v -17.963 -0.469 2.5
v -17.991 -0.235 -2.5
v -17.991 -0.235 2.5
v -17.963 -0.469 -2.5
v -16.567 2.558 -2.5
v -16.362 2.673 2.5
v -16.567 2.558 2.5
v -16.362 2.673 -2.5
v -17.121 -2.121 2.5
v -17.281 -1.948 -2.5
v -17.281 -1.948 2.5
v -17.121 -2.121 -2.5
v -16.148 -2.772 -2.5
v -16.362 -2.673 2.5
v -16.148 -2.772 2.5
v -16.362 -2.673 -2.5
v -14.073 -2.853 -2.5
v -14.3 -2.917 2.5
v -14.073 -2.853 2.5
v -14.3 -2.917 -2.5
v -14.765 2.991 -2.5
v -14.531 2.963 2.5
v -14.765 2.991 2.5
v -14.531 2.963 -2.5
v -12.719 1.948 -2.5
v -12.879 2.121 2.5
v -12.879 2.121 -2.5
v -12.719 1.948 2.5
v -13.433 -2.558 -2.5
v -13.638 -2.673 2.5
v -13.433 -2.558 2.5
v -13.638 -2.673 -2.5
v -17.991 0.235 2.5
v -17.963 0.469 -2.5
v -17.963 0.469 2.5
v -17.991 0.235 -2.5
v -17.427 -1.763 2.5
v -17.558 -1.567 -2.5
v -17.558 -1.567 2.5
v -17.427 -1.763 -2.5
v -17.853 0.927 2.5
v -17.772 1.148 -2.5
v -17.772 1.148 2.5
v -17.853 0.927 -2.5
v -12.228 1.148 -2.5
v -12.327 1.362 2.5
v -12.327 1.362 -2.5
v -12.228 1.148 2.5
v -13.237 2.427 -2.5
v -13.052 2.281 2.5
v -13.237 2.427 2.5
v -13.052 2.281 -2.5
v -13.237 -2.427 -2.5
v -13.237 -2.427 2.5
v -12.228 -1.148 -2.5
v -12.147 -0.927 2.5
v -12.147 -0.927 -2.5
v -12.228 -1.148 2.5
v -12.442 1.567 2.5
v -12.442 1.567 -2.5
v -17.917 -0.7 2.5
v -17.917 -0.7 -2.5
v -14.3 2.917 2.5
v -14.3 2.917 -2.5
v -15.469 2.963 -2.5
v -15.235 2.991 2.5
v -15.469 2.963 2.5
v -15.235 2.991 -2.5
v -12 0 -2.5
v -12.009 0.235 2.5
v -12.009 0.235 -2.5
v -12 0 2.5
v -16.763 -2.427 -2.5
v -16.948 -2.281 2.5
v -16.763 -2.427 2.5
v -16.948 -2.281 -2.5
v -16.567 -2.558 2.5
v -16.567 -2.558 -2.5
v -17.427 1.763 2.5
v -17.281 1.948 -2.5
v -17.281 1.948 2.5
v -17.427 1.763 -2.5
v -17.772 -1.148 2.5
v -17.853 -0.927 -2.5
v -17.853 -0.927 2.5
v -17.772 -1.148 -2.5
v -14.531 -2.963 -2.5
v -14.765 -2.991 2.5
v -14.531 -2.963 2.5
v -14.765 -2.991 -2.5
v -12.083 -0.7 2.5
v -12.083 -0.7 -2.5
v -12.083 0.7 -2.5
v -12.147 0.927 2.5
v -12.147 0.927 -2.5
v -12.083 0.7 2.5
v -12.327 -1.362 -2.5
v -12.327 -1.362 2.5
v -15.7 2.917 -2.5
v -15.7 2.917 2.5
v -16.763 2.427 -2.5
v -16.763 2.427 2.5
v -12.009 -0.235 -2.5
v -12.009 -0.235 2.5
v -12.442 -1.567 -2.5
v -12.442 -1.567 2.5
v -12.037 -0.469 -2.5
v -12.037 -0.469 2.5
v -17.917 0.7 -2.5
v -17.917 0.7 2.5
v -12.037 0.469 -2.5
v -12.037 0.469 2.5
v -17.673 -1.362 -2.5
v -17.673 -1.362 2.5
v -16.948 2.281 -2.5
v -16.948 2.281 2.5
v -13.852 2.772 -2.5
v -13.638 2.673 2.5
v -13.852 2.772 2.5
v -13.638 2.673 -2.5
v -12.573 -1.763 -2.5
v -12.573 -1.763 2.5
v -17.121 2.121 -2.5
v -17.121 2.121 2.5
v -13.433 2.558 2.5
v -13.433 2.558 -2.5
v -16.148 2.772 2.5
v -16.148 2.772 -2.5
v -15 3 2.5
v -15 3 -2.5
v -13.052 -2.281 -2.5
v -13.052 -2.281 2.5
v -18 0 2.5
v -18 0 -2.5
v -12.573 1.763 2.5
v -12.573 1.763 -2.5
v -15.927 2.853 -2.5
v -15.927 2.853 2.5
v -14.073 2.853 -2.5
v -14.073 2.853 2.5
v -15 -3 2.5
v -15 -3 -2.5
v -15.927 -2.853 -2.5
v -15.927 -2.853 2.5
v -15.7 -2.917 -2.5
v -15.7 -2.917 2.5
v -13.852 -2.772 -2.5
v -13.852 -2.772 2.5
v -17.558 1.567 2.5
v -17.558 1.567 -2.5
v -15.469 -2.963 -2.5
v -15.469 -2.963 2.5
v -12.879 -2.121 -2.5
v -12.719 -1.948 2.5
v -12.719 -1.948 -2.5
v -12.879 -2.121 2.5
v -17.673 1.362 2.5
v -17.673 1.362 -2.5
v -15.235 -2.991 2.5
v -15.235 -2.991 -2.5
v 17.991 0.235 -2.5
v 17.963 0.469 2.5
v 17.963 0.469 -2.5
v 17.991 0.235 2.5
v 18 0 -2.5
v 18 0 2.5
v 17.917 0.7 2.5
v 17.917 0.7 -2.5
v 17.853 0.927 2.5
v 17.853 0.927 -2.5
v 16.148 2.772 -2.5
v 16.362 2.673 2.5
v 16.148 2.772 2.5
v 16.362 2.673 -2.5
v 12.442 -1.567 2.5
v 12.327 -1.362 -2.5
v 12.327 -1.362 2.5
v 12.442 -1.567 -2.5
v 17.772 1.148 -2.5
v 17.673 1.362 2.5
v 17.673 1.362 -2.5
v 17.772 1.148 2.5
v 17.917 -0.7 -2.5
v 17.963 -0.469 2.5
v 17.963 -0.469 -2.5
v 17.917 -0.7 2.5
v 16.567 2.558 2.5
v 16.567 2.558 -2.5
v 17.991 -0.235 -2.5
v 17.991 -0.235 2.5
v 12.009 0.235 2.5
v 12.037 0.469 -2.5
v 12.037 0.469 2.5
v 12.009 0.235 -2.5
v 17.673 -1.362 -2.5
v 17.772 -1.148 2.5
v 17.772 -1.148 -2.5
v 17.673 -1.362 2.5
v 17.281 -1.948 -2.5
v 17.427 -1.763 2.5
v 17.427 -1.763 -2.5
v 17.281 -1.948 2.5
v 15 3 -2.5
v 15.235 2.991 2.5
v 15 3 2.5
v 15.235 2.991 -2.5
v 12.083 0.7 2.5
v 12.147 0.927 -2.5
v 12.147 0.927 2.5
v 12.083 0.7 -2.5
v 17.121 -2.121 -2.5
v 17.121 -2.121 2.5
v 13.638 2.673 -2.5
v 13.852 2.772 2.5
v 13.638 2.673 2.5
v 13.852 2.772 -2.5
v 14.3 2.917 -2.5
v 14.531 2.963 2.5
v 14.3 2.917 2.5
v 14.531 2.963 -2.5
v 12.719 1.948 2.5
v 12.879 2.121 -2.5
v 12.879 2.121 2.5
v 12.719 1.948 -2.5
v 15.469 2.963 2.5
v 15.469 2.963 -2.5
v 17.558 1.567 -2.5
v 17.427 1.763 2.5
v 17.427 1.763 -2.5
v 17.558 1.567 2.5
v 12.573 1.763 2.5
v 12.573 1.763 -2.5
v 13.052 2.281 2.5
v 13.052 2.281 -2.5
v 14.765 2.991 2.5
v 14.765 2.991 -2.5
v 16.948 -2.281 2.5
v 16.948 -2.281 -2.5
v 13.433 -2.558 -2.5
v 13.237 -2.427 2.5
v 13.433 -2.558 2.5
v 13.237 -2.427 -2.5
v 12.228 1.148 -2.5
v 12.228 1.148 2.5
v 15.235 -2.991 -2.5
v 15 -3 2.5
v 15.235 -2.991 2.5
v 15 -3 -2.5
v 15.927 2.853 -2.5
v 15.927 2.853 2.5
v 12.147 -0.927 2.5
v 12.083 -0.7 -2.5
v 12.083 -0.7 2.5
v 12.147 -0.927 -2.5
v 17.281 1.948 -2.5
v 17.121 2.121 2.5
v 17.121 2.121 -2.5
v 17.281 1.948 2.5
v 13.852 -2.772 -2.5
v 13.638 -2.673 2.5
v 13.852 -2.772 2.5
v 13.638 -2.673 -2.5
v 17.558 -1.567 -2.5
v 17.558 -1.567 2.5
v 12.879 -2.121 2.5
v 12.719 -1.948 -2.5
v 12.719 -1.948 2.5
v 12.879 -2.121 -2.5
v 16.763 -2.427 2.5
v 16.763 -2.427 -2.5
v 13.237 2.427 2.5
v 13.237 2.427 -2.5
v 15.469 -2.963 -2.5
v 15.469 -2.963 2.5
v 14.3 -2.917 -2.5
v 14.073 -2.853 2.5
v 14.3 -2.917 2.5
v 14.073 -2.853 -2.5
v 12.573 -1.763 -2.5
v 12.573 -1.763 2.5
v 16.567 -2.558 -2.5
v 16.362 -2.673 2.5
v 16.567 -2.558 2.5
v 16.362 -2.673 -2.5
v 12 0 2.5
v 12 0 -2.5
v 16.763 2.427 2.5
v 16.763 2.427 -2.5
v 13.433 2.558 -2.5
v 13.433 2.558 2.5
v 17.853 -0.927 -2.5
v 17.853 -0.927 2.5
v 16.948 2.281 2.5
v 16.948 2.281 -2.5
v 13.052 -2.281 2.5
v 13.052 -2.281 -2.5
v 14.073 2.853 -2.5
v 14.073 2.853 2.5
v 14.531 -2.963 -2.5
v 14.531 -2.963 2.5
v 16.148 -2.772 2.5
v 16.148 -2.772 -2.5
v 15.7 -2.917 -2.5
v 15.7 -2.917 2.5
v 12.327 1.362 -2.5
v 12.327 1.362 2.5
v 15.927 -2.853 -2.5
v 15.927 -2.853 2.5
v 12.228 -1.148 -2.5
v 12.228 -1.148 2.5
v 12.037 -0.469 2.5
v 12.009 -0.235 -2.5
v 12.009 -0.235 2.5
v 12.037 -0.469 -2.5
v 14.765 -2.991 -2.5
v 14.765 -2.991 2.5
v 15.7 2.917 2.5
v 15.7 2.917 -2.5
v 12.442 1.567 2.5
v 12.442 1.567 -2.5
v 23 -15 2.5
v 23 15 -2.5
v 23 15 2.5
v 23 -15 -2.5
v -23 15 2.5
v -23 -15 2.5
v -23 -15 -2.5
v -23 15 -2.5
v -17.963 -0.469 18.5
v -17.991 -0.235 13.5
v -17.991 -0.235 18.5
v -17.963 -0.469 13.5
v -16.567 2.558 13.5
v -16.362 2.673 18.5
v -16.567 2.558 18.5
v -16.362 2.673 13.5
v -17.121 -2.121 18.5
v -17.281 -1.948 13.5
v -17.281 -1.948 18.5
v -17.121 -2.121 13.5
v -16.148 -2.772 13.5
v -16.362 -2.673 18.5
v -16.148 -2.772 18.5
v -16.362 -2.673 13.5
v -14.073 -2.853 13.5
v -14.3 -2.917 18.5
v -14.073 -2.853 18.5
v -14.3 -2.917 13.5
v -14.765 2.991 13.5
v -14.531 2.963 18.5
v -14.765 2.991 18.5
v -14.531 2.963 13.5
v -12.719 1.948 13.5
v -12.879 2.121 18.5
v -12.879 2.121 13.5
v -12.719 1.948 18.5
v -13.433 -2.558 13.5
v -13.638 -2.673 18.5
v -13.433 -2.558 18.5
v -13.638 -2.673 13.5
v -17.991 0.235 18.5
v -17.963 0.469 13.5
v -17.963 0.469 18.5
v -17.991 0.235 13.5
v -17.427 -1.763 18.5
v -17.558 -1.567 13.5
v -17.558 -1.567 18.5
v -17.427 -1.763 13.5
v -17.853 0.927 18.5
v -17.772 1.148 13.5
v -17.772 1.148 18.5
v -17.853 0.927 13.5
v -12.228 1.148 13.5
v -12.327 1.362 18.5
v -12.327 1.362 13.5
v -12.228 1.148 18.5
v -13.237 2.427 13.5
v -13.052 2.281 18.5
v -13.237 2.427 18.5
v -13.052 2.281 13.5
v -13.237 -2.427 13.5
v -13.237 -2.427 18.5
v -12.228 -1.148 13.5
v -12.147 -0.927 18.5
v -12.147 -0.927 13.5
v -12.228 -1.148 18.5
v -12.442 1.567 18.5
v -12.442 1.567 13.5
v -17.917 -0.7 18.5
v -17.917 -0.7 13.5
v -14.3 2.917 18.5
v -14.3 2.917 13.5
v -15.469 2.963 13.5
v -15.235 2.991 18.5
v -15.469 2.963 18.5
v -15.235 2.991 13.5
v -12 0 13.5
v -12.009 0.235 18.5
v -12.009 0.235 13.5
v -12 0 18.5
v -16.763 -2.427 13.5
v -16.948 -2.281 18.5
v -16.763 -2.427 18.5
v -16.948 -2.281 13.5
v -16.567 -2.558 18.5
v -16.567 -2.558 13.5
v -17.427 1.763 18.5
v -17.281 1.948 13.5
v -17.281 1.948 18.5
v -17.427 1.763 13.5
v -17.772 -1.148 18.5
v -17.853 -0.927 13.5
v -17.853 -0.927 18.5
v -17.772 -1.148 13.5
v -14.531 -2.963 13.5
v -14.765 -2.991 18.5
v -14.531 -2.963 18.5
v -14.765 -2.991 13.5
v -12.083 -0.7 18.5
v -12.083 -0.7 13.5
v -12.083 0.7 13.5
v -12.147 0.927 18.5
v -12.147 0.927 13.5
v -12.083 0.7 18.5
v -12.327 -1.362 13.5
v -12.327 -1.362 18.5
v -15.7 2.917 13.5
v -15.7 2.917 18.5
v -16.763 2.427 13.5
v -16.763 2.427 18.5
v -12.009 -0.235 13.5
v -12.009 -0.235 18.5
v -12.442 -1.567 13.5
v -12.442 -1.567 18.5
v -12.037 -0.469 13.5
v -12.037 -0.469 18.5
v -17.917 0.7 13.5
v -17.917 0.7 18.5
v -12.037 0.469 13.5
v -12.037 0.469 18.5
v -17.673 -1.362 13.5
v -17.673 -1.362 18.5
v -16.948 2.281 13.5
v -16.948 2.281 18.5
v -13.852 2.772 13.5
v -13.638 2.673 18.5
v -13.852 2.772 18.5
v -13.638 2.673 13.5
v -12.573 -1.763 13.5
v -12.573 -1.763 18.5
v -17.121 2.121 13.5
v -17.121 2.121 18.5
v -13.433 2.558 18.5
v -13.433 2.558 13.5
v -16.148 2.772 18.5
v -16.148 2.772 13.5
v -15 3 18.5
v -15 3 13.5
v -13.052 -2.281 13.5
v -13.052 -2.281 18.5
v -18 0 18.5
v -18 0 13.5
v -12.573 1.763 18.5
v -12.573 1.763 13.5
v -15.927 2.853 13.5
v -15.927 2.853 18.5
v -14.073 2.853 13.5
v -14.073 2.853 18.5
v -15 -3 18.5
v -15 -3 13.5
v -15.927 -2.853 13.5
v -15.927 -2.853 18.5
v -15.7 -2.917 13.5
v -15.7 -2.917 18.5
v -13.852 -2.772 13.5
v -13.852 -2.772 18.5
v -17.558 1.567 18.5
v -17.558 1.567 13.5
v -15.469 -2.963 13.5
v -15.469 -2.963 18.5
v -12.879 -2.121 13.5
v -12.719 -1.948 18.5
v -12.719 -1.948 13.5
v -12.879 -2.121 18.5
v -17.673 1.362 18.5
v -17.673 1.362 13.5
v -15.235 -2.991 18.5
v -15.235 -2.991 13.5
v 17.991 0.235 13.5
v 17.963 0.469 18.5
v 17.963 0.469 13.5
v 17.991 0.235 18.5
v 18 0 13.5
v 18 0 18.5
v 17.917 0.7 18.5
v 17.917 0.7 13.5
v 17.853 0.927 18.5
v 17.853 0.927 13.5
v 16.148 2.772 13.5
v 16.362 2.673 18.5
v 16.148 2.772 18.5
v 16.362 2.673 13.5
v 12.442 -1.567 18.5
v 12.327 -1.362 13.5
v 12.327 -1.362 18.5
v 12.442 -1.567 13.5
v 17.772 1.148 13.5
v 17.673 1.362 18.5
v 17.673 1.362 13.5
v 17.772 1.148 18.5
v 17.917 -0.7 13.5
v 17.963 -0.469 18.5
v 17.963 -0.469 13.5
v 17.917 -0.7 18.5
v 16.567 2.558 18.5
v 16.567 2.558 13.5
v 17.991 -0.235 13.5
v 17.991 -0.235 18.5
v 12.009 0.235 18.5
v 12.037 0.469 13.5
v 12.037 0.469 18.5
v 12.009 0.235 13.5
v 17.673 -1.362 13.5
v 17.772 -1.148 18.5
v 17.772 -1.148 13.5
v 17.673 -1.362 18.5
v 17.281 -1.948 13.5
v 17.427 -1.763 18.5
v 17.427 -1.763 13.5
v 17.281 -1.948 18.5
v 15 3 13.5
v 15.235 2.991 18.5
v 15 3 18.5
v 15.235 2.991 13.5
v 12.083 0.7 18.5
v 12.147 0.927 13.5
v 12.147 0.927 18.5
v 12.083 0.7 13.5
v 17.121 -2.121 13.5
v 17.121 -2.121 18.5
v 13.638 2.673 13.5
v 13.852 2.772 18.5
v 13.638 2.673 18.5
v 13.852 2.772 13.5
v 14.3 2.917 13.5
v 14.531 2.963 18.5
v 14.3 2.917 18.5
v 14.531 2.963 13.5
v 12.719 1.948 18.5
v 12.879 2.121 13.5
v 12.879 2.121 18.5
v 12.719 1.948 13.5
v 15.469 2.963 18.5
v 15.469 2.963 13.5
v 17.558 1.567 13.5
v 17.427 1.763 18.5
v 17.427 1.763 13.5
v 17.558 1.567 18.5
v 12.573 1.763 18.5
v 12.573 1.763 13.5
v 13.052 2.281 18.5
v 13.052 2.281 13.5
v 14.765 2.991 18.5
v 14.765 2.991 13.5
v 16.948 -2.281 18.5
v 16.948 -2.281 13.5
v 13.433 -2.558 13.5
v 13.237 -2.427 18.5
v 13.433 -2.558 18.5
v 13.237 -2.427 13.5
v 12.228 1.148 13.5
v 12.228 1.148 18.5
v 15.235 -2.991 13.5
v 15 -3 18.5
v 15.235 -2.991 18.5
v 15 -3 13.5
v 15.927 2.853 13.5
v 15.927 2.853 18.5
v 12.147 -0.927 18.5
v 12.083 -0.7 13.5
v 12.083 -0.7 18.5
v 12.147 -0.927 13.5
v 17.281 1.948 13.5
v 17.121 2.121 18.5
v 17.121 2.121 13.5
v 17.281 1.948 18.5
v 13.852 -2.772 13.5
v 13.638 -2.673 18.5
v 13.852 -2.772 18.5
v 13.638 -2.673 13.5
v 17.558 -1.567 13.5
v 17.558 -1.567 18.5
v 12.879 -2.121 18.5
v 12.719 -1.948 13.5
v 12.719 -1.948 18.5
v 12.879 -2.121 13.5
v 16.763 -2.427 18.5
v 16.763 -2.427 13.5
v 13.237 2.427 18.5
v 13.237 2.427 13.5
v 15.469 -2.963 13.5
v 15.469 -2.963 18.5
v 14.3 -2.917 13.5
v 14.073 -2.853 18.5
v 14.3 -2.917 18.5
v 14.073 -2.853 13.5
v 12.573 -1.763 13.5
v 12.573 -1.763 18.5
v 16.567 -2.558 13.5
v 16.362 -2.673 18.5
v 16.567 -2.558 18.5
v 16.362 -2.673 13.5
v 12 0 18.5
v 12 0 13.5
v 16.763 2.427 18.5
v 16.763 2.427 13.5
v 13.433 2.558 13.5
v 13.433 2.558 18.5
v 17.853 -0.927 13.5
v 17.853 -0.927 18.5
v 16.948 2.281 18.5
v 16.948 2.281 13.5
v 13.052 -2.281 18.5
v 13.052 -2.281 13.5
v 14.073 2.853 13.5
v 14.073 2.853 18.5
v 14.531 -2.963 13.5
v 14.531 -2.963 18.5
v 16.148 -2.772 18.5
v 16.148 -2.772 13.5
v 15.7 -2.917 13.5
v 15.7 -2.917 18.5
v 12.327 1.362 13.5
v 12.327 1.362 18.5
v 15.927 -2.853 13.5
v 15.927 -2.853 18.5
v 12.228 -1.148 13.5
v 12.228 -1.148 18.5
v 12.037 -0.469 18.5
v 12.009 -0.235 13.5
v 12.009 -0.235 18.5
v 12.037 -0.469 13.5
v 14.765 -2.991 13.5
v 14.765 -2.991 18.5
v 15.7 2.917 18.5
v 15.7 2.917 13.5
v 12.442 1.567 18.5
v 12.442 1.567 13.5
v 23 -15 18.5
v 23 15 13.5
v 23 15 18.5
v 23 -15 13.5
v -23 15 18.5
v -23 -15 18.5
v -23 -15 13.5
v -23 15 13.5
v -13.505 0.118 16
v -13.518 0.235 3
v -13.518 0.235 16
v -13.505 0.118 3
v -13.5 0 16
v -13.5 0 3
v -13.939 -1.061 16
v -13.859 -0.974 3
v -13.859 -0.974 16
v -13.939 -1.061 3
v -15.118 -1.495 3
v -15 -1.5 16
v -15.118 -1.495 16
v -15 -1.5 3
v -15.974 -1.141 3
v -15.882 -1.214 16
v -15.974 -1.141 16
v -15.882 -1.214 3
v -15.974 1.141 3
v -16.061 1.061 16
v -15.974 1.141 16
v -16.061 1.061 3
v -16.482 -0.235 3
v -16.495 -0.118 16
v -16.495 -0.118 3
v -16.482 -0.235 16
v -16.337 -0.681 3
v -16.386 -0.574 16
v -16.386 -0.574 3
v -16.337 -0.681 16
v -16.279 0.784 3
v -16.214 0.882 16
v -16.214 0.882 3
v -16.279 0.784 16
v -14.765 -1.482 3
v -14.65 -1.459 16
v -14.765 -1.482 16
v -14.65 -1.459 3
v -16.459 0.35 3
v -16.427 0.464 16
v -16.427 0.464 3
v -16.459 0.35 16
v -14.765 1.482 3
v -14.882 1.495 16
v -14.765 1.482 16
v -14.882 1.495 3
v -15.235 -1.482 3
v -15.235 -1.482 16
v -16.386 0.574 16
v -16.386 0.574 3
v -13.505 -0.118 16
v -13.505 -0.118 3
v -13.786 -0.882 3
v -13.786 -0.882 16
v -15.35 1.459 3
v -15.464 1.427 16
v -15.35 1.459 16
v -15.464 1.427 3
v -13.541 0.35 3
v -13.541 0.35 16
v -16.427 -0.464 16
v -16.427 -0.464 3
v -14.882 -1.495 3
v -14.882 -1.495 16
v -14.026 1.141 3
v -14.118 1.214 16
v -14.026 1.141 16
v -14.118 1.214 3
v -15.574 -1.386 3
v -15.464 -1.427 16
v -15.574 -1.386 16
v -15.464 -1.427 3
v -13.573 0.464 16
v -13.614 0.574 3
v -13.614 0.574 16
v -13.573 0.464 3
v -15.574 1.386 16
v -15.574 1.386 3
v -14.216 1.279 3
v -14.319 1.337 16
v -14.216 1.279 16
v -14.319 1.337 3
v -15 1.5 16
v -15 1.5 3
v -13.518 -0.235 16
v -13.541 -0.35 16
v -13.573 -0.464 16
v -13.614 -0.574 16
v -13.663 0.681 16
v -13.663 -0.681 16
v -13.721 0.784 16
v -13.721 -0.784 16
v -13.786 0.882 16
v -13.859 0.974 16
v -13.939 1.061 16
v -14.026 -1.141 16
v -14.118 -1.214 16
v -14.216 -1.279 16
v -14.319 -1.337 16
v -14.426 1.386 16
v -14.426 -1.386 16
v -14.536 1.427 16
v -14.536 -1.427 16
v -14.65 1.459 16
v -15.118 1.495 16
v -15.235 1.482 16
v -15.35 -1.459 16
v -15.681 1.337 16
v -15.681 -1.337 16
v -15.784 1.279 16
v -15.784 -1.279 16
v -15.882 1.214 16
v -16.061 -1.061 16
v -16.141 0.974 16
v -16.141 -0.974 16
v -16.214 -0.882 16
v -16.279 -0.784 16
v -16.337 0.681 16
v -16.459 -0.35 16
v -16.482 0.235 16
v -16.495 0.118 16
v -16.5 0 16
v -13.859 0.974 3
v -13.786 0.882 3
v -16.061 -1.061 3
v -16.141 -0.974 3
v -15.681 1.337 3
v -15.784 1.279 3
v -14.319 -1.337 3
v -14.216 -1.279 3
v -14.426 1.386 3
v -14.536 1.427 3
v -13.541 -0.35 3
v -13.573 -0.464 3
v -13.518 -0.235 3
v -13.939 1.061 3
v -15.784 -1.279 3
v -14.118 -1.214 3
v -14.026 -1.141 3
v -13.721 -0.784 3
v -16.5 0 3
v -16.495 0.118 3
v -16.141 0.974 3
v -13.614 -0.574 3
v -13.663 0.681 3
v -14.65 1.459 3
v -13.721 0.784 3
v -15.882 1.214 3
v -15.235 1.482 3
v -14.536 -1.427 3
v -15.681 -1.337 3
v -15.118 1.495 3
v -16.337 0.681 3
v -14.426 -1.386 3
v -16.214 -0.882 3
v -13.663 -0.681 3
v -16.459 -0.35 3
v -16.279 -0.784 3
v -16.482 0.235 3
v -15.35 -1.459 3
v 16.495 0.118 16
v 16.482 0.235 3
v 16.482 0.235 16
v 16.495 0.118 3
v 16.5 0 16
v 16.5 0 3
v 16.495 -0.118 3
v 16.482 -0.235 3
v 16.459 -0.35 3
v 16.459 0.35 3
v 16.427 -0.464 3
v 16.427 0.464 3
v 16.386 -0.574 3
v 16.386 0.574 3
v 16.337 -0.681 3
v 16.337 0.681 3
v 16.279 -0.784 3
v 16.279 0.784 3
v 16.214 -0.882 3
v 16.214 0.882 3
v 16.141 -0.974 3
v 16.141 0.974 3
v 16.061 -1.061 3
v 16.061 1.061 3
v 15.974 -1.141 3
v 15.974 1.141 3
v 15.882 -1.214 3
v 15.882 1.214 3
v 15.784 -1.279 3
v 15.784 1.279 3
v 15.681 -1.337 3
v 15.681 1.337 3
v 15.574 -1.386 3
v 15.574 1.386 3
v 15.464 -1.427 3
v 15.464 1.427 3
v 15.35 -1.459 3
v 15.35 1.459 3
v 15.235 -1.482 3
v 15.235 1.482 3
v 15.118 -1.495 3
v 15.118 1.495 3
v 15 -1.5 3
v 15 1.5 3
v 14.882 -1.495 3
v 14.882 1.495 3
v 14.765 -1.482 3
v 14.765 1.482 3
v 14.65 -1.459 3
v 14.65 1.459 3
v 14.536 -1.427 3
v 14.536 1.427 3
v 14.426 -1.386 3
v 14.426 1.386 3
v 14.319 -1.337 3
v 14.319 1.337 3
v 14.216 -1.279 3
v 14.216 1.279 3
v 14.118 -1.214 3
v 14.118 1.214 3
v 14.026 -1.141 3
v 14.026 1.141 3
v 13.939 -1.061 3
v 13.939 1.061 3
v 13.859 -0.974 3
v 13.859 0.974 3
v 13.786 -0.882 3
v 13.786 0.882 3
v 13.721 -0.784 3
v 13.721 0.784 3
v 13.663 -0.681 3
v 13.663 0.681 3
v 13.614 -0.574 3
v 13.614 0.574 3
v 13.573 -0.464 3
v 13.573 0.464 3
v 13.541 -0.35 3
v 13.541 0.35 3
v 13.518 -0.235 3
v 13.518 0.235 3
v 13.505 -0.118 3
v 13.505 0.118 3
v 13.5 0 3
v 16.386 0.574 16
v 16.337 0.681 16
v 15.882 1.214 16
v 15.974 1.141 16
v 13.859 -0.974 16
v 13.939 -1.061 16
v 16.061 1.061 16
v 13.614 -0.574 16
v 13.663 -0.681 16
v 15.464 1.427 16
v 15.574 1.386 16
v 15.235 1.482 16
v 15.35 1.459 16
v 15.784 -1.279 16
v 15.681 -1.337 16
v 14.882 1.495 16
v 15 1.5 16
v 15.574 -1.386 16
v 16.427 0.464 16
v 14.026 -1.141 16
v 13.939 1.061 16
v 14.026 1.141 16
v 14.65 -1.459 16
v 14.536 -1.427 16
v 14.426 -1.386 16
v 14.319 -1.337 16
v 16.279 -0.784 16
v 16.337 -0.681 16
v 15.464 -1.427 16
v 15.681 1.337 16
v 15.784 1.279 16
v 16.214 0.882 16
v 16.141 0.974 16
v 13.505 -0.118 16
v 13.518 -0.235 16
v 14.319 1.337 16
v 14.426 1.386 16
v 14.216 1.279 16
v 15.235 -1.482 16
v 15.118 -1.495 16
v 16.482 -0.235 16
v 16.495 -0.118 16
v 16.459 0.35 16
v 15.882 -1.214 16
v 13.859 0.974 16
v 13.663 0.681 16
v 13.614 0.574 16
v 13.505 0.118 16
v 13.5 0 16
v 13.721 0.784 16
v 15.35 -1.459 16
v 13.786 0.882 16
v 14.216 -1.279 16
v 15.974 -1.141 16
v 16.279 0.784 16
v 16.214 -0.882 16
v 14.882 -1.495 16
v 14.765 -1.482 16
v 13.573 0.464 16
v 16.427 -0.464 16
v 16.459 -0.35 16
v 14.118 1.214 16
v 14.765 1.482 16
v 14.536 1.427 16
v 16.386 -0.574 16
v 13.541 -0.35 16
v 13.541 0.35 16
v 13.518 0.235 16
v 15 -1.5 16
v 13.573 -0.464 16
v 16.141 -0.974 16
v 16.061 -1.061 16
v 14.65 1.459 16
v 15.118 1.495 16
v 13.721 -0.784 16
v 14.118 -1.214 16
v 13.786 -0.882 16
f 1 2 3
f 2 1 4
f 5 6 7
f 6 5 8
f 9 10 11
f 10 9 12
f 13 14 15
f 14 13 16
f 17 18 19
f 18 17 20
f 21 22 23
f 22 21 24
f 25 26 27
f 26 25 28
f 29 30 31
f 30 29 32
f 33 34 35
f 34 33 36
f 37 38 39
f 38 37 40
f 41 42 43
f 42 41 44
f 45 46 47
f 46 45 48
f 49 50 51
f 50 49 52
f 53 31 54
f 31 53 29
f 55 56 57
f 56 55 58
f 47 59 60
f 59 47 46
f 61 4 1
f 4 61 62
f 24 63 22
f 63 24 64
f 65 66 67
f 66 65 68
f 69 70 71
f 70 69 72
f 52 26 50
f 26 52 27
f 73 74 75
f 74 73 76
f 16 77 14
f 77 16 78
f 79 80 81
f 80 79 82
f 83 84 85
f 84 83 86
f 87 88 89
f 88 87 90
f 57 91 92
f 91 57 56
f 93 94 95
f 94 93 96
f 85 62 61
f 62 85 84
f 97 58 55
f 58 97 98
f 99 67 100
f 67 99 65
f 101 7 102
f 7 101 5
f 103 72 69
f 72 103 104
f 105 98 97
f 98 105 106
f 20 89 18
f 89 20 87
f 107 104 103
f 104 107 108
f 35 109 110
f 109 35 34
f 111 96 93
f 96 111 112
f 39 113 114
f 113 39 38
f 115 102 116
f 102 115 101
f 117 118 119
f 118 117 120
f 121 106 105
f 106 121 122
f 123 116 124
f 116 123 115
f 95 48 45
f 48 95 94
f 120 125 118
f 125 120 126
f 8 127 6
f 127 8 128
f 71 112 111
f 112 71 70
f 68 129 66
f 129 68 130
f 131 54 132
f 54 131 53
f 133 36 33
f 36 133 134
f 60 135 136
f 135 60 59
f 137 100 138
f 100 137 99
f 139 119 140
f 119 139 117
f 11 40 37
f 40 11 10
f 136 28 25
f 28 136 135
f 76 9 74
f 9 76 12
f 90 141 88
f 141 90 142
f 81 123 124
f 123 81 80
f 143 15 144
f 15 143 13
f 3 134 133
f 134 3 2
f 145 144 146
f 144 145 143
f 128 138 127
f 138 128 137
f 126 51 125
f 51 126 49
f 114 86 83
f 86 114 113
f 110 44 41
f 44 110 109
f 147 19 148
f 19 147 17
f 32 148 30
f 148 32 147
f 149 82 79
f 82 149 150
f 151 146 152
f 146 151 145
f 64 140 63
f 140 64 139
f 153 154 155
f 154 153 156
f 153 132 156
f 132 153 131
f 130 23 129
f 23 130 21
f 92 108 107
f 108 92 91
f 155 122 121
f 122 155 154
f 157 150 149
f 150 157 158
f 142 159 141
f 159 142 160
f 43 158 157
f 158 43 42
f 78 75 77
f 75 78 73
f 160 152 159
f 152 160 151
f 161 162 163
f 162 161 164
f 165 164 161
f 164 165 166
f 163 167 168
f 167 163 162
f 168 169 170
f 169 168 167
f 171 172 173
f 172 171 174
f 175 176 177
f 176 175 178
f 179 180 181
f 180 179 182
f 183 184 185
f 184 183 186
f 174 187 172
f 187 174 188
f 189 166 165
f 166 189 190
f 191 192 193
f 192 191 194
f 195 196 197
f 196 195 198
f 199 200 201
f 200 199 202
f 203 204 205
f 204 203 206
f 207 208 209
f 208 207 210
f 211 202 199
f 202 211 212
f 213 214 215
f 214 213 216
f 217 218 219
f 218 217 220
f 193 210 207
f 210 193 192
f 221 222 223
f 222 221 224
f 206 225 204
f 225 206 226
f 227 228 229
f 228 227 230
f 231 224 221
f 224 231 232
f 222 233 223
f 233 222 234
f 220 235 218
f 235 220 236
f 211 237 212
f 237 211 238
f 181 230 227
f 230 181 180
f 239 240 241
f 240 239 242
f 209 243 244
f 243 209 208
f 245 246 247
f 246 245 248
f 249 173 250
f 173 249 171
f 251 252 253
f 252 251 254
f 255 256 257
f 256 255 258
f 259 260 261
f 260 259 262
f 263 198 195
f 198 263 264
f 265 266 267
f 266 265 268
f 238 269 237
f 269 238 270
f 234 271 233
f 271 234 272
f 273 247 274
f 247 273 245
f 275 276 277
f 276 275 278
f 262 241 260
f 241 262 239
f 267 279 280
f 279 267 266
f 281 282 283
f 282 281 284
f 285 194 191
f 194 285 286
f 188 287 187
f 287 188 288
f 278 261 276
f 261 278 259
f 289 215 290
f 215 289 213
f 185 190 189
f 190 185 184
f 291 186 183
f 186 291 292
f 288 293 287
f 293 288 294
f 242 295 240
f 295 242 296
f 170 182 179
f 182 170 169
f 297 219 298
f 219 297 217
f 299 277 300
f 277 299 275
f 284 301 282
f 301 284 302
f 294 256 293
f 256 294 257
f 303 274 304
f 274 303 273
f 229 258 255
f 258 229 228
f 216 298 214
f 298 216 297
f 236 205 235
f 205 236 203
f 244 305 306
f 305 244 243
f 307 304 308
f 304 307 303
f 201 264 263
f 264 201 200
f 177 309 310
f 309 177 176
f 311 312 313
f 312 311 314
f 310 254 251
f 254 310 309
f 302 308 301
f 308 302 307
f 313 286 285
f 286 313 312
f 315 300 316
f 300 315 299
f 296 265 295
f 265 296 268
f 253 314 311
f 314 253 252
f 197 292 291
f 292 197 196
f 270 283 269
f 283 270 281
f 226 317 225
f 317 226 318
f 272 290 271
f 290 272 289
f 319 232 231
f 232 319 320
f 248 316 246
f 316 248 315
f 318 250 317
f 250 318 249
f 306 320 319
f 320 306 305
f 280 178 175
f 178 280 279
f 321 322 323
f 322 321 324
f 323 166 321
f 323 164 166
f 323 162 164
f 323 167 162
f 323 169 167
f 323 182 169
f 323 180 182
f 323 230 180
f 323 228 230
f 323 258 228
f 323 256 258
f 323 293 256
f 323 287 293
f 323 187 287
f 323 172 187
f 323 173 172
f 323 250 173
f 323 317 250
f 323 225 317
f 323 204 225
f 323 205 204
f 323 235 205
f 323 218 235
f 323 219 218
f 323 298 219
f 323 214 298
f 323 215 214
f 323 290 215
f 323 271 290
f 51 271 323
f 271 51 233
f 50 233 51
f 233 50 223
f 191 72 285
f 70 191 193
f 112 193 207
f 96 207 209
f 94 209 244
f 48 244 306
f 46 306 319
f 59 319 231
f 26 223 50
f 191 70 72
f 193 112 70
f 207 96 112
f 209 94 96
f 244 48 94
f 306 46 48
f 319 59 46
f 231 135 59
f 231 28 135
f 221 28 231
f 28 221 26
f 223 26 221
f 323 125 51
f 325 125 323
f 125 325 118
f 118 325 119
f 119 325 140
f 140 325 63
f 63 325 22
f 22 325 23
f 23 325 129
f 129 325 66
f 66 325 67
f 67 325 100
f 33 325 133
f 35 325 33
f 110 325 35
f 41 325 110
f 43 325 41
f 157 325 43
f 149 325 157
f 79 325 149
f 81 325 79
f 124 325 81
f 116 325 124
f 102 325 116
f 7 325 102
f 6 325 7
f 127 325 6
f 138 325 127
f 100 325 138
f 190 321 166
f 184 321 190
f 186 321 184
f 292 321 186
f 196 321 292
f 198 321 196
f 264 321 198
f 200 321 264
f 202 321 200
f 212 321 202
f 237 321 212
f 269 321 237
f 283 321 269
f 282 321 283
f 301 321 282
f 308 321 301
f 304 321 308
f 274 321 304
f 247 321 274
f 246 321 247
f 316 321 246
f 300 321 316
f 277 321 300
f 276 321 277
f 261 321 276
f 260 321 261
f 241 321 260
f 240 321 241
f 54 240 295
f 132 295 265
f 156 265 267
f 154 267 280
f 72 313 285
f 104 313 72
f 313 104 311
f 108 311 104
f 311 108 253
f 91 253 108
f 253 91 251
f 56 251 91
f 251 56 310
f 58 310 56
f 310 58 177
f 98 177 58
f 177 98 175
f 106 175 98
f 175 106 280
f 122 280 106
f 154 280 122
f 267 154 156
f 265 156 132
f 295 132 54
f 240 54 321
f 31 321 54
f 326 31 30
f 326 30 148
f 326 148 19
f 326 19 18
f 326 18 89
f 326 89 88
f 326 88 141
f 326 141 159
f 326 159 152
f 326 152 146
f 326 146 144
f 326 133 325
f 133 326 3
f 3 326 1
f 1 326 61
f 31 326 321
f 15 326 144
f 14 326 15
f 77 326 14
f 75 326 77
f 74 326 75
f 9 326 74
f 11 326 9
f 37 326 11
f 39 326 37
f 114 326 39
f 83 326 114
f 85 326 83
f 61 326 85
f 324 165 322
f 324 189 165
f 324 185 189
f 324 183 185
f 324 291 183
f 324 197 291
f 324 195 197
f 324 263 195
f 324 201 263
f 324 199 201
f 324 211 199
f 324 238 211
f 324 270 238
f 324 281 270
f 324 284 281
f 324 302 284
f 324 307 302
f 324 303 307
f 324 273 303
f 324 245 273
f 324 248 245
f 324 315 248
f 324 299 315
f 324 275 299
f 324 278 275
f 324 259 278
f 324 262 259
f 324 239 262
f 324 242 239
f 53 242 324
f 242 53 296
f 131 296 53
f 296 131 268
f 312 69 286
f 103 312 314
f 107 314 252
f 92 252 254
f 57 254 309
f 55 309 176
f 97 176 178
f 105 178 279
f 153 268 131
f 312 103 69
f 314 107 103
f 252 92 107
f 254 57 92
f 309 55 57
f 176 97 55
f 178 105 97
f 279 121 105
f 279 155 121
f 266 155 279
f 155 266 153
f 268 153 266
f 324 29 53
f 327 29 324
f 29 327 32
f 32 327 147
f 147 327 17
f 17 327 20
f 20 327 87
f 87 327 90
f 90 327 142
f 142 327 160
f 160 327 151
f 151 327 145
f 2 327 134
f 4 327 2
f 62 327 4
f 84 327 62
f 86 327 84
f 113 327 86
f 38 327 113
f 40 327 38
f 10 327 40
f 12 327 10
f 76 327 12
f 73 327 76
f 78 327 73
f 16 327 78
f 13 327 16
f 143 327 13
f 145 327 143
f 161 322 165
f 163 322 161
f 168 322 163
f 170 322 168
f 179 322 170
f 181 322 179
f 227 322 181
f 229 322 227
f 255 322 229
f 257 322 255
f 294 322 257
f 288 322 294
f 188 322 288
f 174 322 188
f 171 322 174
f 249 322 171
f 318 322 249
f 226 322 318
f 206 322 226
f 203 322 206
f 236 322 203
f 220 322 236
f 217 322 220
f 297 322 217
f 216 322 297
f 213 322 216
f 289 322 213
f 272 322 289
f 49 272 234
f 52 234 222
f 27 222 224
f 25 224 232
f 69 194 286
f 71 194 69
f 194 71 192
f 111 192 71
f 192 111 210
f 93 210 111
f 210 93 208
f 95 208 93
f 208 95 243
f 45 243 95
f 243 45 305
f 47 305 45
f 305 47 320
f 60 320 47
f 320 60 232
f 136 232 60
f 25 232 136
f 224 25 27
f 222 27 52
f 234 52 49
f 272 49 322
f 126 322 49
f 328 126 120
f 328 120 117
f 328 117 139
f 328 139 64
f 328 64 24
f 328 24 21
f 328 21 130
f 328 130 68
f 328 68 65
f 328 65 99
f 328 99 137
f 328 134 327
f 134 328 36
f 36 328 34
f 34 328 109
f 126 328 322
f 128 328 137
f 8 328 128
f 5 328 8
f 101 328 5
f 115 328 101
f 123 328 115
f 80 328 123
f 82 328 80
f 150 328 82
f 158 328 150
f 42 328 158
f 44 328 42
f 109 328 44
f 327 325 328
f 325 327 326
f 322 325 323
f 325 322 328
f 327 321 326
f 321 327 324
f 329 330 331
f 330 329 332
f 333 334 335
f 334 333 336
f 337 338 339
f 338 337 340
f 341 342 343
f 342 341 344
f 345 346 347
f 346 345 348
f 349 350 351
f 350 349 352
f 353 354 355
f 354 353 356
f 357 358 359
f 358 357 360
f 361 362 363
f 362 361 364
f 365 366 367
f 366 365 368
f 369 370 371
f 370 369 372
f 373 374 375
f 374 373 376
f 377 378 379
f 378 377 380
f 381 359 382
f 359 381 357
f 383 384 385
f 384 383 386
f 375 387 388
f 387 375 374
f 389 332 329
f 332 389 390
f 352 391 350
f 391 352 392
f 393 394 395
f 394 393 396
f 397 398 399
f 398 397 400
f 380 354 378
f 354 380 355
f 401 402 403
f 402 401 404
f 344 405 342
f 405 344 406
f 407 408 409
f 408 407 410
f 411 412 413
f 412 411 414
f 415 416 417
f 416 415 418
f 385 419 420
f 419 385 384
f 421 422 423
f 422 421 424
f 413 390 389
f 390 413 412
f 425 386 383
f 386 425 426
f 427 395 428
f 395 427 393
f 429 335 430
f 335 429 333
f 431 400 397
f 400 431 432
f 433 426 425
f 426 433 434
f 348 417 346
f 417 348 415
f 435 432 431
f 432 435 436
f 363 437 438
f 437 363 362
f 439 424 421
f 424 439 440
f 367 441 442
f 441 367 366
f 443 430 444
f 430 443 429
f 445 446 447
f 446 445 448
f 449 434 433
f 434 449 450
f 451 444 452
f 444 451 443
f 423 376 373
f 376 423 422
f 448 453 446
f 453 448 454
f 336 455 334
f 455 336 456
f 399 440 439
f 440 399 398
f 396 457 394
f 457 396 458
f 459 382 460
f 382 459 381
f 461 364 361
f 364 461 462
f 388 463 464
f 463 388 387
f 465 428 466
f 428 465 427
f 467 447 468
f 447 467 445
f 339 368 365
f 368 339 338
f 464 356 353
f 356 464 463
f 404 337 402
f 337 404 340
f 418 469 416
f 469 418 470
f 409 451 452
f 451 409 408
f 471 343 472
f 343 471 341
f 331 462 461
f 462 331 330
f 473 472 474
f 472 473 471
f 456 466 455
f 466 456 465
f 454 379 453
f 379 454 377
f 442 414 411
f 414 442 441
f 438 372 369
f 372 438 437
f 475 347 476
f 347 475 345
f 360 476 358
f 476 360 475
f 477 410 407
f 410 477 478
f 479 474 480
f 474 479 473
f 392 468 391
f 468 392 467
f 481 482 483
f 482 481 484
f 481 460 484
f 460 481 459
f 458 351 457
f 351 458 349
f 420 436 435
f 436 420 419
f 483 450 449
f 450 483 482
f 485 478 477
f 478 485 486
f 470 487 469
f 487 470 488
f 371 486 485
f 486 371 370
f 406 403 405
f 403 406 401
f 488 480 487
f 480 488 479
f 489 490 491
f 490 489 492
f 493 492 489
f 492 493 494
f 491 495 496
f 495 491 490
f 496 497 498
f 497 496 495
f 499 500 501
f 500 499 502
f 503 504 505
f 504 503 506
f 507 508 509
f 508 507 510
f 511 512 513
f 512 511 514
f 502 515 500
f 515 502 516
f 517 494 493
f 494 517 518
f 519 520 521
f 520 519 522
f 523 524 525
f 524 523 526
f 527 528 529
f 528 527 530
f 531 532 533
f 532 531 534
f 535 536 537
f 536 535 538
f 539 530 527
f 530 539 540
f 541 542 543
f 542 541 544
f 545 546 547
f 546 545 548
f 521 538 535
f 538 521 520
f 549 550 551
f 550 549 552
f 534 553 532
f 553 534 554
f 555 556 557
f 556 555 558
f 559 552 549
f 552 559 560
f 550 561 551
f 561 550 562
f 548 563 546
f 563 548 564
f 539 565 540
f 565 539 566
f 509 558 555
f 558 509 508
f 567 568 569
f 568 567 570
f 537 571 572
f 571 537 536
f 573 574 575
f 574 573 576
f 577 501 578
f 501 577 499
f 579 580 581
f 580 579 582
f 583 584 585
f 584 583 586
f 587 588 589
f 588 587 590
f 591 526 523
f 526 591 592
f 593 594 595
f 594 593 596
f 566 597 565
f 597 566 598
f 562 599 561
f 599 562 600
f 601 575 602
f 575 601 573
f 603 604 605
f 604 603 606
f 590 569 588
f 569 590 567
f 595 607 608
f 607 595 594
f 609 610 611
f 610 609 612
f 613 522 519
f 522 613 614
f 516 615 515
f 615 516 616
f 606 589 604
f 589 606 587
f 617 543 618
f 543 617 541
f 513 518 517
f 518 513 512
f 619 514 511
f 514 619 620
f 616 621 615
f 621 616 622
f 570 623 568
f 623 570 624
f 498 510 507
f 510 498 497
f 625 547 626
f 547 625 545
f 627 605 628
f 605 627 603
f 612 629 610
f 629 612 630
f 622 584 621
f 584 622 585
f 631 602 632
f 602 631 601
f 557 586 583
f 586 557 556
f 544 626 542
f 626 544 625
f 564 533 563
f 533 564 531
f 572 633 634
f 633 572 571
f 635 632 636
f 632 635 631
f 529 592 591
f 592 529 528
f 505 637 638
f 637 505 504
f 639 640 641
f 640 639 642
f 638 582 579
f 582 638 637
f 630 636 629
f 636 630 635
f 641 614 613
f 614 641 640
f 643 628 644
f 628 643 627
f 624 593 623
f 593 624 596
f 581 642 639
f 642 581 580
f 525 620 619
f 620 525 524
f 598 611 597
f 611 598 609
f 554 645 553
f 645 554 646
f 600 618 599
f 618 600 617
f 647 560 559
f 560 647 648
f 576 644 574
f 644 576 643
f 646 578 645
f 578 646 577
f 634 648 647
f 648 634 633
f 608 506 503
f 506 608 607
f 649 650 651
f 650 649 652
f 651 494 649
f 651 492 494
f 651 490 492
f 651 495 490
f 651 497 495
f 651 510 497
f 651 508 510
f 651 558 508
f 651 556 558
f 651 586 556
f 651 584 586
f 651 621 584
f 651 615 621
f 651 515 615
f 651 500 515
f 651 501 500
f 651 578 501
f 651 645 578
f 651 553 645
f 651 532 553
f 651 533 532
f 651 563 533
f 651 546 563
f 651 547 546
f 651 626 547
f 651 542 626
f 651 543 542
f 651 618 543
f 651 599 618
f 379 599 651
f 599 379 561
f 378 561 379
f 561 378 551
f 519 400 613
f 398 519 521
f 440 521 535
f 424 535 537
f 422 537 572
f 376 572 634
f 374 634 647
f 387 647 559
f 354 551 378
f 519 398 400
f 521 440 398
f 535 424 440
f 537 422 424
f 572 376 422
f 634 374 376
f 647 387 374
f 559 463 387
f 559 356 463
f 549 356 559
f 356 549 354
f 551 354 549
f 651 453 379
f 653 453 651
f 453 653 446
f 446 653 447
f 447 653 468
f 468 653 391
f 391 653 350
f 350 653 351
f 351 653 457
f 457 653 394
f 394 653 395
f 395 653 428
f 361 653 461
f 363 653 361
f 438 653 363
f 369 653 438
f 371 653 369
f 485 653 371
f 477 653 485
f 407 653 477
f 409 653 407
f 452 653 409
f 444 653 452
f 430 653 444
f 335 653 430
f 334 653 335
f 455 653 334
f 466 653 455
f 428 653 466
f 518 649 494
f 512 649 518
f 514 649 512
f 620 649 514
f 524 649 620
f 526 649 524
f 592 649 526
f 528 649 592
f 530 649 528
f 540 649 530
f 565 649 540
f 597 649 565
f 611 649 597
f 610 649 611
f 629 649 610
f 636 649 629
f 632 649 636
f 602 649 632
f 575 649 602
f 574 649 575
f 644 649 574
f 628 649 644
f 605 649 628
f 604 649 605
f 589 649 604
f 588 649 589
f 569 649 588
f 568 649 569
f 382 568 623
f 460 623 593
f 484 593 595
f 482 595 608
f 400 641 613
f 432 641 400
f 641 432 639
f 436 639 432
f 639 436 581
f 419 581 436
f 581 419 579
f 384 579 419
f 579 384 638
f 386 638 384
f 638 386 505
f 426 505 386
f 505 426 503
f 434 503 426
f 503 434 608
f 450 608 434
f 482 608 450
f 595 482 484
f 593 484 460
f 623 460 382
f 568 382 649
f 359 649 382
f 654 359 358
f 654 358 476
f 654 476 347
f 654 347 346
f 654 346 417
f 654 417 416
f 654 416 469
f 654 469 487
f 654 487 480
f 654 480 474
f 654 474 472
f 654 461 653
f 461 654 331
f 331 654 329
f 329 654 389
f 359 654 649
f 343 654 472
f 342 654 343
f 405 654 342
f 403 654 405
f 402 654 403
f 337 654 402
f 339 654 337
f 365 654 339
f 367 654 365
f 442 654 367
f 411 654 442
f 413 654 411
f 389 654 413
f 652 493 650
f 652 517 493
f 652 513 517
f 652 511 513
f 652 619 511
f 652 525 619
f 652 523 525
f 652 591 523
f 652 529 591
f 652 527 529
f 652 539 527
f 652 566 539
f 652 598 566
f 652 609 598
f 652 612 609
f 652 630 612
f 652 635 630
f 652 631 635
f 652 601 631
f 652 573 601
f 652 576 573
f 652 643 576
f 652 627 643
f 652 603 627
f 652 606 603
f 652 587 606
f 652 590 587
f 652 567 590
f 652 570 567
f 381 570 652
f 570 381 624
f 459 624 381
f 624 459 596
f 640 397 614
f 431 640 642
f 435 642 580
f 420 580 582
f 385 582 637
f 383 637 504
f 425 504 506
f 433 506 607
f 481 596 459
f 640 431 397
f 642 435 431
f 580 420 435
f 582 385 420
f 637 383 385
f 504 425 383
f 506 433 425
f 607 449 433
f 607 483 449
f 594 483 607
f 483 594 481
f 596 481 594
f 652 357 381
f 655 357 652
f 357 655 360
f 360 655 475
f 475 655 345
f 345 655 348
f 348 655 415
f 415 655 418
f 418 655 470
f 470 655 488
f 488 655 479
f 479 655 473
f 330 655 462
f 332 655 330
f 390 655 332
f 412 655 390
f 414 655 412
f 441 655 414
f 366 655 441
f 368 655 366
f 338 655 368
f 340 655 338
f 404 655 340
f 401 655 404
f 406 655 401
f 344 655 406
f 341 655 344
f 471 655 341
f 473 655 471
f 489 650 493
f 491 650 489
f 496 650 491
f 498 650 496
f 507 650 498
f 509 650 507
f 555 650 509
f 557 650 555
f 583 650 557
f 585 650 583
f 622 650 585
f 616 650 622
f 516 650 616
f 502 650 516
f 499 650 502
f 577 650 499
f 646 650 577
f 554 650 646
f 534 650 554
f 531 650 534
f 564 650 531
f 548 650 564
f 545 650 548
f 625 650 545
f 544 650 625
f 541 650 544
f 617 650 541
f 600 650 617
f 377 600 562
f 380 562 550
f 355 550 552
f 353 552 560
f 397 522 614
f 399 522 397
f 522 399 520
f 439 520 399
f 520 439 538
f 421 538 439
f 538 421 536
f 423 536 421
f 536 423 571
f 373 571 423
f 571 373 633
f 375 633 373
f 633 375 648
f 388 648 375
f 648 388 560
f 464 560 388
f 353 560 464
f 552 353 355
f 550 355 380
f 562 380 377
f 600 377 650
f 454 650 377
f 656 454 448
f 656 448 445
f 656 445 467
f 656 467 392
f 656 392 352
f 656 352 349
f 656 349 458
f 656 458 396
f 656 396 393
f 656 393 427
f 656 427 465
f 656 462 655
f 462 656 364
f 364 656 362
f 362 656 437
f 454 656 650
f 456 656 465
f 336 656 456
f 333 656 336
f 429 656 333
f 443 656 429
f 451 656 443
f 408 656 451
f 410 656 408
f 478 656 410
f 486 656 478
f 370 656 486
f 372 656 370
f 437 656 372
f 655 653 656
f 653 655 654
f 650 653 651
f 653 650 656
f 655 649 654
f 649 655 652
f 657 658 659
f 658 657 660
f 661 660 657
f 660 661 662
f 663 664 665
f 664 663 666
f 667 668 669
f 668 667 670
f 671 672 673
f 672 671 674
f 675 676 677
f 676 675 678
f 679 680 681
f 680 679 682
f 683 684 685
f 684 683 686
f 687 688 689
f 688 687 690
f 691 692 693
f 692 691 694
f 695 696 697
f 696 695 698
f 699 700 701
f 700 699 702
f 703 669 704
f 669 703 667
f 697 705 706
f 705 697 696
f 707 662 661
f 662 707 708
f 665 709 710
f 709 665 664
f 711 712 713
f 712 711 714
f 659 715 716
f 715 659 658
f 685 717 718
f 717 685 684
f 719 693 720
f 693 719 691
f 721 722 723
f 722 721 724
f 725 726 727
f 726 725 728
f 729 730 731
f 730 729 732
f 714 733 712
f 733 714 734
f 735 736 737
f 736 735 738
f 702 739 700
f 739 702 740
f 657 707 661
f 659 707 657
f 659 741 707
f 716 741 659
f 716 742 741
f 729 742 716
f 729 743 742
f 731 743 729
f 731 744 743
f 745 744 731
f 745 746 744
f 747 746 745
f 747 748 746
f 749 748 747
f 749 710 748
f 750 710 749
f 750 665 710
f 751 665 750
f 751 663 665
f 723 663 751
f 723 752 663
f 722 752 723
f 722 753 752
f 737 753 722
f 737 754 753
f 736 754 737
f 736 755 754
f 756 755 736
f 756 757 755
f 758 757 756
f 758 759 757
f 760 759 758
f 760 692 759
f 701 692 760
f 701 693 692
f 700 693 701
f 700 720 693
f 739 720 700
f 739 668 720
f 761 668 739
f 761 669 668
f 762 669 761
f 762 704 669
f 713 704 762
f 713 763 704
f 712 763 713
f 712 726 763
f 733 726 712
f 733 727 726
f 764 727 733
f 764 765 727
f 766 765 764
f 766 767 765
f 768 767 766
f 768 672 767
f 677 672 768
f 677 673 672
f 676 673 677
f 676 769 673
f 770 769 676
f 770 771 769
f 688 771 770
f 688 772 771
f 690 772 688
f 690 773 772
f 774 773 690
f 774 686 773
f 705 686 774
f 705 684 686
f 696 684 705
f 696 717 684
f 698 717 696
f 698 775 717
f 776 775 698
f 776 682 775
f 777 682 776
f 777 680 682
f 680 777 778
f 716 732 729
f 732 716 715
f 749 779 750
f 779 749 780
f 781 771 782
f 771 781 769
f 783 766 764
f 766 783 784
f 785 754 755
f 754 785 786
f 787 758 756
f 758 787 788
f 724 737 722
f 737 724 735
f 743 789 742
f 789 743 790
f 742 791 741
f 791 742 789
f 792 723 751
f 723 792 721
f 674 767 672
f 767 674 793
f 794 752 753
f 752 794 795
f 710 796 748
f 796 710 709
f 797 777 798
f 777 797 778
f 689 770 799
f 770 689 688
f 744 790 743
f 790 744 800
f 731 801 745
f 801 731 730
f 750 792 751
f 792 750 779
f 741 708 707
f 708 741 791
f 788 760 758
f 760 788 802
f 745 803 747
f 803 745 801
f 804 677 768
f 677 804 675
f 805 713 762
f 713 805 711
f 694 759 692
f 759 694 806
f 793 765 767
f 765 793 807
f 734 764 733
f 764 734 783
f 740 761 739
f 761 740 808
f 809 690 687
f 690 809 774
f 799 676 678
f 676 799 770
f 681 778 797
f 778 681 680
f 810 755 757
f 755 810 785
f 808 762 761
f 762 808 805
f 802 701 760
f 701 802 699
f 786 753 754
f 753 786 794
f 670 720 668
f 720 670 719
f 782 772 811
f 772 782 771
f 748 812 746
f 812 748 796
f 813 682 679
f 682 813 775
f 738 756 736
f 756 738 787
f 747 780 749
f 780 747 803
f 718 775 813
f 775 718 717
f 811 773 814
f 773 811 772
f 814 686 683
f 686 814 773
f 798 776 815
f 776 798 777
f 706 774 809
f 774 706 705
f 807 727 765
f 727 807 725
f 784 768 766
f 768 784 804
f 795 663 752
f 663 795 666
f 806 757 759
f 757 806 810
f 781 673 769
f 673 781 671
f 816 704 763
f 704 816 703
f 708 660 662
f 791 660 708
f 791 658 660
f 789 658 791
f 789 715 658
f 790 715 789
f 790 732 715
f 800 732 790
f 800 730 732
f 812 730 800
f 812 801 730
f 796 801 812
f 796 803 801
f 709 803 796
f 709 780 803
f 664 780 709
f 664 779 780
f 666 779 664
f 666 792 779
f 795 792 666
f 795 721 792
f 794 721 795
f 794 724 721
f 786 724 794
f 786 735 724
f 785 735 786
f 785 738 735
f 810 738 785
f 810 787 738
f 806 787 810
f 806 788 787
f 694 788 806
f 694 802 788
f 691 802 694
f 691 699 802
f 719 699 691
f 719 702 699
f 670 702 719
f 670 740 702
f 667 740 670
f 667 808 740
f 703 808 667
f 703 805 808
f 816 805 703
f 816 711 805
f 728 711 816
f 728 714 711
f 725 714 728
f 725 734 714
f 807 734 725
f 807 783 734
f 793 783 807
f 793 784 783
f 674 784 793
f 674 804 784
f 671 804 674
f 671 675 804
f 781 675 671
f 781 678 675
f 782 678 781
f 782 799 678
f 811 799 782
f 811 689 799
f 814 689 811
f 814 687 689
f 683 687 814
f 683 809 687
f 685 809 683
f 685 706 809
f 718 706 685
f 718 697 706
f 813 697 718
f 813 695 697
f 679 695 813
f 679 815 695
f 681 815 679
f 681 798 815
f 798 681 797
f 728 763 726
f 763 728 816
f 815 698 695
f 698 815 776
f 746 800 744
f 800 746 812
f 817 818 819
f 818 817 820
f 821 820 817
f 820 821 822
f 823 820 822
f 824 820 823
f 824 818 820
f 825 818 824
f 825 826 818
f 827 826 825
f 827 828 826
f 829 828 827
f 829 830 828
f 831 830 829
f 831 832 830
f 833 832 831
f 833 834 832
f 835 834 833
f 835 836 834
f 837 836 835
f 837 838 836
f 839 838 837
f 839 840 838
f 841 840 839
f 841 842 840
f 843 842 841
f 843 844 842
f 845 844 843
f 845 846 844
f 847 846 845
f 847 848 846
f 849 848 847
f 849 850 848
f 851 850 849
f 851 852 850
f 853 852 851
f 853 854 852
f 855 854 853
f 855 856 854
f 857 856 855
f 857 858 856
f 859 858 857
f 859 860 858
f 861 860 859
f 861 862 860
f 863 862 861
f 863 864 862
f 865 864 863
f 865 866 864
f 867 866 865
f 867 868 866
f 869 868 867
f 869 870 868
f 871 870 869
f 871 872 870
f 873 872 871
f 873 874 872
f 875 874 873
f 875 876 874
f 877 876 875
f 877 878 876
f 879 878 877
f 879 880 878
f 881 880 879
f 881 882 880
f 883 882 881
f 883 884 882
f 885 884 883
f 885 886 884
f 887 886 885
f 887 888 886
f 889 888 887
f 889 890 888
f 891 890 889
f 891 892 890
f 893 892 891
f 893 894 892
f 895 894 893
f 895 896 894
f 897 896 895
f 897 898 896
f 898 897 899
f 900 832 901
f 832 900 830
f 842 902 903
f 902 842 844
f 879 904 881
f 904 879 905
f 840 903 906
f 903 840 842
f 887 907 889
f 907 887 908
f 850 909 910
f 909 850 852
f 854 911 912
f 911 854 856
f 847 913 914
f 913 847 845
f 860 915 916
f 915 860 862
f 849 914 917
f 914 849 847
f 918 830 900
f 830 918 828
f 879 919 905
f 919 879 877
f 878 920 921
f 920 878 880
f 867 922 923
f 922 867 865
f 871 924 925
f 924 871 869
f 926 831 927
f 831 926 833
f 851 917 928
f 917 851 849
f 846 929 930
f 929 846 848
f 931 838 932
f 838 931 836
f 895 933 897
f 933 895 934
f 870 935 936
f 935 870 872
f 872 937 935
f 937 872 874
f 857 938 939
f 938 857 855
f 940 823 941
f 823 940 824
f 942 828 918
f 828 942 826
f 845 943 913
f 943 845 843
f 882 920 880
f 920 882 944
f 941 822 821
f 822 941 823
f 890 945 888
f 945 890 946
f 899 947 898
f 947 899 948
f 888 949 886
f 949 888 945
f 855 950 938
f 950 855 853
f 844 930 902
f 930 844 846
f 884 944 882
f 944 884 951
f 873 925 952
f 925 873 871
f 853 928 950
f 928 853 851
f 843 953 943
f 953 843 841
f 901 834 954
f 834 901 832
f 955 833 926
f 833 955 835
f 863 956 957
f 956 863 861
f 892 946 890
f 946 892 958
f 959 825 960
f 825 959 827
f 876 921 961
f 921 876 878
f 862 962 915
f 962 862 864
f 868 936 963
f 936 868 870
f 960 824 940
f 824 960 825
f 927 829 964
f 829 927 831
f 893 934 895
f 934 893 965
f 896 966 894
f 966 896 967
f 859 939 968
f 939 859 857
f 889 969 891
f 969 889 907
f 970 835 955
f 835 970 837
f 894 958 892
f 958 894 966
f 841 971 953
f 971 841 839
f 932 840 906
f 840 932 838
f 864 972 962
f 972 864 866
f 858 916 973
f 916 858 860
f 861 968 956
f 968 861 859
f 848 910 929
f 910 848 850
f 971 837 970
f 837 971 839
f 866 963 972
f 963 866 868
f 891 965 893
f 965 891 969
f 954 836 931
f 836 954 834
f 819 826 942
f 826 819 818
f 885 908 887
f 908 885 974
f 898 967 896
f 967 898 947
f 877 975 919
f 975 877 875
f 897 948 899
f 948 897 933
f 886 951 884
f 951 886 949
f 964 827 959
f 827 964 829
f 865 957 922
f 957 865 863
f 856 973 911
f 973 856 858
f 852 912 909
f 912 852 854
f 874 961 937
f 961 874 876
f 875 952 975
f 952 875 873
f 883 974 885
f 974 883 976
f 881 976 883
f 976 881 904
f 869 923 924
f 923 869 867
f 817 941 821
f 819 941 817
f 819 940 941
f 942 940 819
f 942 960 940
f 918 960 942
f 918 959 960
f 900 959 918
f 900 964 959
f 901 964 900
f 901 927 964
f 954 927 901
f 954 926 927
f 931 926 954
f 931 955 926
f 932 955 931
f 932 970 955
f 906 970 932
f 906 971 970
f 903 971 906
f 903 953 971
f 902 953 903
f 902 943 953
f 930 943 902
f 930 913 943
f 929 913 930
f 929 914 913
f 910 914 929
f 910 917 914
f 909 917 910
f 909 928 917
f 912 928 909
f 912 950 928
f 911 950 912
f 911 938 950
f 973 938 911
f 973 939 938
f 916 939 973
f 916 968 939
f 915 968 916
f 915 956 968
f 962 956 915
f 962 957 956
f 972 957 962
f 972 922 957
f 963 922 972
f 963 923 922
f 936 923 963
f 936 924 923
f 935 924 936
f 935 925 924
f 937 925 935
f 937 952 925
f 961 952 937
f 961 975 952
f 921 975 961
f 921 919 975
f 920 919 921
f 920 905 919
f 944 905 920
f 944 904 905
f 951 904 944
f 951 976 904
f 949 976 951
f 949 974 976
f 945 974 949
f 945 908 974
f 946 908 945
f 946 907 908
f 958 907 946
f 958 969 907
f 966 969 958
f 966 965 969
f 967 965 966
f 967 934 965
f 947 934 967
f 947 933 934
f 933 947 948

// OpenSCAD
// NEUROSHIELD CONCEPT ONLY -- NEVER INSTALL ON PROTECTIVE EQUIPMENT.
// Visualization fixture only: no certified clearances, stresses, retention,
// material properties, force response, manufacturability or safety validation.
$fn = 80;
travel_mm = 7.000;
plate_width = 46;
plate_height = 30;
plate_thick = 5;
module plate() {
    difference() {
      cube([plate_width,plate_height,plate_thick],center=true);
      for(x=[-15,15]) translate([x,0,0]) cylinder(h=10,d=6,center=true);
    }
}
color([0.16,0.38,0.63]) plate();
translate([0,0,9+travel_mm]) color([0.85,0.52,0.13]) plate();
for (x=[-15,15]) translate([x,0,3]) color([0.32,0.75,0.67])
 cylinder(h=6+travel_mm, d=3);
